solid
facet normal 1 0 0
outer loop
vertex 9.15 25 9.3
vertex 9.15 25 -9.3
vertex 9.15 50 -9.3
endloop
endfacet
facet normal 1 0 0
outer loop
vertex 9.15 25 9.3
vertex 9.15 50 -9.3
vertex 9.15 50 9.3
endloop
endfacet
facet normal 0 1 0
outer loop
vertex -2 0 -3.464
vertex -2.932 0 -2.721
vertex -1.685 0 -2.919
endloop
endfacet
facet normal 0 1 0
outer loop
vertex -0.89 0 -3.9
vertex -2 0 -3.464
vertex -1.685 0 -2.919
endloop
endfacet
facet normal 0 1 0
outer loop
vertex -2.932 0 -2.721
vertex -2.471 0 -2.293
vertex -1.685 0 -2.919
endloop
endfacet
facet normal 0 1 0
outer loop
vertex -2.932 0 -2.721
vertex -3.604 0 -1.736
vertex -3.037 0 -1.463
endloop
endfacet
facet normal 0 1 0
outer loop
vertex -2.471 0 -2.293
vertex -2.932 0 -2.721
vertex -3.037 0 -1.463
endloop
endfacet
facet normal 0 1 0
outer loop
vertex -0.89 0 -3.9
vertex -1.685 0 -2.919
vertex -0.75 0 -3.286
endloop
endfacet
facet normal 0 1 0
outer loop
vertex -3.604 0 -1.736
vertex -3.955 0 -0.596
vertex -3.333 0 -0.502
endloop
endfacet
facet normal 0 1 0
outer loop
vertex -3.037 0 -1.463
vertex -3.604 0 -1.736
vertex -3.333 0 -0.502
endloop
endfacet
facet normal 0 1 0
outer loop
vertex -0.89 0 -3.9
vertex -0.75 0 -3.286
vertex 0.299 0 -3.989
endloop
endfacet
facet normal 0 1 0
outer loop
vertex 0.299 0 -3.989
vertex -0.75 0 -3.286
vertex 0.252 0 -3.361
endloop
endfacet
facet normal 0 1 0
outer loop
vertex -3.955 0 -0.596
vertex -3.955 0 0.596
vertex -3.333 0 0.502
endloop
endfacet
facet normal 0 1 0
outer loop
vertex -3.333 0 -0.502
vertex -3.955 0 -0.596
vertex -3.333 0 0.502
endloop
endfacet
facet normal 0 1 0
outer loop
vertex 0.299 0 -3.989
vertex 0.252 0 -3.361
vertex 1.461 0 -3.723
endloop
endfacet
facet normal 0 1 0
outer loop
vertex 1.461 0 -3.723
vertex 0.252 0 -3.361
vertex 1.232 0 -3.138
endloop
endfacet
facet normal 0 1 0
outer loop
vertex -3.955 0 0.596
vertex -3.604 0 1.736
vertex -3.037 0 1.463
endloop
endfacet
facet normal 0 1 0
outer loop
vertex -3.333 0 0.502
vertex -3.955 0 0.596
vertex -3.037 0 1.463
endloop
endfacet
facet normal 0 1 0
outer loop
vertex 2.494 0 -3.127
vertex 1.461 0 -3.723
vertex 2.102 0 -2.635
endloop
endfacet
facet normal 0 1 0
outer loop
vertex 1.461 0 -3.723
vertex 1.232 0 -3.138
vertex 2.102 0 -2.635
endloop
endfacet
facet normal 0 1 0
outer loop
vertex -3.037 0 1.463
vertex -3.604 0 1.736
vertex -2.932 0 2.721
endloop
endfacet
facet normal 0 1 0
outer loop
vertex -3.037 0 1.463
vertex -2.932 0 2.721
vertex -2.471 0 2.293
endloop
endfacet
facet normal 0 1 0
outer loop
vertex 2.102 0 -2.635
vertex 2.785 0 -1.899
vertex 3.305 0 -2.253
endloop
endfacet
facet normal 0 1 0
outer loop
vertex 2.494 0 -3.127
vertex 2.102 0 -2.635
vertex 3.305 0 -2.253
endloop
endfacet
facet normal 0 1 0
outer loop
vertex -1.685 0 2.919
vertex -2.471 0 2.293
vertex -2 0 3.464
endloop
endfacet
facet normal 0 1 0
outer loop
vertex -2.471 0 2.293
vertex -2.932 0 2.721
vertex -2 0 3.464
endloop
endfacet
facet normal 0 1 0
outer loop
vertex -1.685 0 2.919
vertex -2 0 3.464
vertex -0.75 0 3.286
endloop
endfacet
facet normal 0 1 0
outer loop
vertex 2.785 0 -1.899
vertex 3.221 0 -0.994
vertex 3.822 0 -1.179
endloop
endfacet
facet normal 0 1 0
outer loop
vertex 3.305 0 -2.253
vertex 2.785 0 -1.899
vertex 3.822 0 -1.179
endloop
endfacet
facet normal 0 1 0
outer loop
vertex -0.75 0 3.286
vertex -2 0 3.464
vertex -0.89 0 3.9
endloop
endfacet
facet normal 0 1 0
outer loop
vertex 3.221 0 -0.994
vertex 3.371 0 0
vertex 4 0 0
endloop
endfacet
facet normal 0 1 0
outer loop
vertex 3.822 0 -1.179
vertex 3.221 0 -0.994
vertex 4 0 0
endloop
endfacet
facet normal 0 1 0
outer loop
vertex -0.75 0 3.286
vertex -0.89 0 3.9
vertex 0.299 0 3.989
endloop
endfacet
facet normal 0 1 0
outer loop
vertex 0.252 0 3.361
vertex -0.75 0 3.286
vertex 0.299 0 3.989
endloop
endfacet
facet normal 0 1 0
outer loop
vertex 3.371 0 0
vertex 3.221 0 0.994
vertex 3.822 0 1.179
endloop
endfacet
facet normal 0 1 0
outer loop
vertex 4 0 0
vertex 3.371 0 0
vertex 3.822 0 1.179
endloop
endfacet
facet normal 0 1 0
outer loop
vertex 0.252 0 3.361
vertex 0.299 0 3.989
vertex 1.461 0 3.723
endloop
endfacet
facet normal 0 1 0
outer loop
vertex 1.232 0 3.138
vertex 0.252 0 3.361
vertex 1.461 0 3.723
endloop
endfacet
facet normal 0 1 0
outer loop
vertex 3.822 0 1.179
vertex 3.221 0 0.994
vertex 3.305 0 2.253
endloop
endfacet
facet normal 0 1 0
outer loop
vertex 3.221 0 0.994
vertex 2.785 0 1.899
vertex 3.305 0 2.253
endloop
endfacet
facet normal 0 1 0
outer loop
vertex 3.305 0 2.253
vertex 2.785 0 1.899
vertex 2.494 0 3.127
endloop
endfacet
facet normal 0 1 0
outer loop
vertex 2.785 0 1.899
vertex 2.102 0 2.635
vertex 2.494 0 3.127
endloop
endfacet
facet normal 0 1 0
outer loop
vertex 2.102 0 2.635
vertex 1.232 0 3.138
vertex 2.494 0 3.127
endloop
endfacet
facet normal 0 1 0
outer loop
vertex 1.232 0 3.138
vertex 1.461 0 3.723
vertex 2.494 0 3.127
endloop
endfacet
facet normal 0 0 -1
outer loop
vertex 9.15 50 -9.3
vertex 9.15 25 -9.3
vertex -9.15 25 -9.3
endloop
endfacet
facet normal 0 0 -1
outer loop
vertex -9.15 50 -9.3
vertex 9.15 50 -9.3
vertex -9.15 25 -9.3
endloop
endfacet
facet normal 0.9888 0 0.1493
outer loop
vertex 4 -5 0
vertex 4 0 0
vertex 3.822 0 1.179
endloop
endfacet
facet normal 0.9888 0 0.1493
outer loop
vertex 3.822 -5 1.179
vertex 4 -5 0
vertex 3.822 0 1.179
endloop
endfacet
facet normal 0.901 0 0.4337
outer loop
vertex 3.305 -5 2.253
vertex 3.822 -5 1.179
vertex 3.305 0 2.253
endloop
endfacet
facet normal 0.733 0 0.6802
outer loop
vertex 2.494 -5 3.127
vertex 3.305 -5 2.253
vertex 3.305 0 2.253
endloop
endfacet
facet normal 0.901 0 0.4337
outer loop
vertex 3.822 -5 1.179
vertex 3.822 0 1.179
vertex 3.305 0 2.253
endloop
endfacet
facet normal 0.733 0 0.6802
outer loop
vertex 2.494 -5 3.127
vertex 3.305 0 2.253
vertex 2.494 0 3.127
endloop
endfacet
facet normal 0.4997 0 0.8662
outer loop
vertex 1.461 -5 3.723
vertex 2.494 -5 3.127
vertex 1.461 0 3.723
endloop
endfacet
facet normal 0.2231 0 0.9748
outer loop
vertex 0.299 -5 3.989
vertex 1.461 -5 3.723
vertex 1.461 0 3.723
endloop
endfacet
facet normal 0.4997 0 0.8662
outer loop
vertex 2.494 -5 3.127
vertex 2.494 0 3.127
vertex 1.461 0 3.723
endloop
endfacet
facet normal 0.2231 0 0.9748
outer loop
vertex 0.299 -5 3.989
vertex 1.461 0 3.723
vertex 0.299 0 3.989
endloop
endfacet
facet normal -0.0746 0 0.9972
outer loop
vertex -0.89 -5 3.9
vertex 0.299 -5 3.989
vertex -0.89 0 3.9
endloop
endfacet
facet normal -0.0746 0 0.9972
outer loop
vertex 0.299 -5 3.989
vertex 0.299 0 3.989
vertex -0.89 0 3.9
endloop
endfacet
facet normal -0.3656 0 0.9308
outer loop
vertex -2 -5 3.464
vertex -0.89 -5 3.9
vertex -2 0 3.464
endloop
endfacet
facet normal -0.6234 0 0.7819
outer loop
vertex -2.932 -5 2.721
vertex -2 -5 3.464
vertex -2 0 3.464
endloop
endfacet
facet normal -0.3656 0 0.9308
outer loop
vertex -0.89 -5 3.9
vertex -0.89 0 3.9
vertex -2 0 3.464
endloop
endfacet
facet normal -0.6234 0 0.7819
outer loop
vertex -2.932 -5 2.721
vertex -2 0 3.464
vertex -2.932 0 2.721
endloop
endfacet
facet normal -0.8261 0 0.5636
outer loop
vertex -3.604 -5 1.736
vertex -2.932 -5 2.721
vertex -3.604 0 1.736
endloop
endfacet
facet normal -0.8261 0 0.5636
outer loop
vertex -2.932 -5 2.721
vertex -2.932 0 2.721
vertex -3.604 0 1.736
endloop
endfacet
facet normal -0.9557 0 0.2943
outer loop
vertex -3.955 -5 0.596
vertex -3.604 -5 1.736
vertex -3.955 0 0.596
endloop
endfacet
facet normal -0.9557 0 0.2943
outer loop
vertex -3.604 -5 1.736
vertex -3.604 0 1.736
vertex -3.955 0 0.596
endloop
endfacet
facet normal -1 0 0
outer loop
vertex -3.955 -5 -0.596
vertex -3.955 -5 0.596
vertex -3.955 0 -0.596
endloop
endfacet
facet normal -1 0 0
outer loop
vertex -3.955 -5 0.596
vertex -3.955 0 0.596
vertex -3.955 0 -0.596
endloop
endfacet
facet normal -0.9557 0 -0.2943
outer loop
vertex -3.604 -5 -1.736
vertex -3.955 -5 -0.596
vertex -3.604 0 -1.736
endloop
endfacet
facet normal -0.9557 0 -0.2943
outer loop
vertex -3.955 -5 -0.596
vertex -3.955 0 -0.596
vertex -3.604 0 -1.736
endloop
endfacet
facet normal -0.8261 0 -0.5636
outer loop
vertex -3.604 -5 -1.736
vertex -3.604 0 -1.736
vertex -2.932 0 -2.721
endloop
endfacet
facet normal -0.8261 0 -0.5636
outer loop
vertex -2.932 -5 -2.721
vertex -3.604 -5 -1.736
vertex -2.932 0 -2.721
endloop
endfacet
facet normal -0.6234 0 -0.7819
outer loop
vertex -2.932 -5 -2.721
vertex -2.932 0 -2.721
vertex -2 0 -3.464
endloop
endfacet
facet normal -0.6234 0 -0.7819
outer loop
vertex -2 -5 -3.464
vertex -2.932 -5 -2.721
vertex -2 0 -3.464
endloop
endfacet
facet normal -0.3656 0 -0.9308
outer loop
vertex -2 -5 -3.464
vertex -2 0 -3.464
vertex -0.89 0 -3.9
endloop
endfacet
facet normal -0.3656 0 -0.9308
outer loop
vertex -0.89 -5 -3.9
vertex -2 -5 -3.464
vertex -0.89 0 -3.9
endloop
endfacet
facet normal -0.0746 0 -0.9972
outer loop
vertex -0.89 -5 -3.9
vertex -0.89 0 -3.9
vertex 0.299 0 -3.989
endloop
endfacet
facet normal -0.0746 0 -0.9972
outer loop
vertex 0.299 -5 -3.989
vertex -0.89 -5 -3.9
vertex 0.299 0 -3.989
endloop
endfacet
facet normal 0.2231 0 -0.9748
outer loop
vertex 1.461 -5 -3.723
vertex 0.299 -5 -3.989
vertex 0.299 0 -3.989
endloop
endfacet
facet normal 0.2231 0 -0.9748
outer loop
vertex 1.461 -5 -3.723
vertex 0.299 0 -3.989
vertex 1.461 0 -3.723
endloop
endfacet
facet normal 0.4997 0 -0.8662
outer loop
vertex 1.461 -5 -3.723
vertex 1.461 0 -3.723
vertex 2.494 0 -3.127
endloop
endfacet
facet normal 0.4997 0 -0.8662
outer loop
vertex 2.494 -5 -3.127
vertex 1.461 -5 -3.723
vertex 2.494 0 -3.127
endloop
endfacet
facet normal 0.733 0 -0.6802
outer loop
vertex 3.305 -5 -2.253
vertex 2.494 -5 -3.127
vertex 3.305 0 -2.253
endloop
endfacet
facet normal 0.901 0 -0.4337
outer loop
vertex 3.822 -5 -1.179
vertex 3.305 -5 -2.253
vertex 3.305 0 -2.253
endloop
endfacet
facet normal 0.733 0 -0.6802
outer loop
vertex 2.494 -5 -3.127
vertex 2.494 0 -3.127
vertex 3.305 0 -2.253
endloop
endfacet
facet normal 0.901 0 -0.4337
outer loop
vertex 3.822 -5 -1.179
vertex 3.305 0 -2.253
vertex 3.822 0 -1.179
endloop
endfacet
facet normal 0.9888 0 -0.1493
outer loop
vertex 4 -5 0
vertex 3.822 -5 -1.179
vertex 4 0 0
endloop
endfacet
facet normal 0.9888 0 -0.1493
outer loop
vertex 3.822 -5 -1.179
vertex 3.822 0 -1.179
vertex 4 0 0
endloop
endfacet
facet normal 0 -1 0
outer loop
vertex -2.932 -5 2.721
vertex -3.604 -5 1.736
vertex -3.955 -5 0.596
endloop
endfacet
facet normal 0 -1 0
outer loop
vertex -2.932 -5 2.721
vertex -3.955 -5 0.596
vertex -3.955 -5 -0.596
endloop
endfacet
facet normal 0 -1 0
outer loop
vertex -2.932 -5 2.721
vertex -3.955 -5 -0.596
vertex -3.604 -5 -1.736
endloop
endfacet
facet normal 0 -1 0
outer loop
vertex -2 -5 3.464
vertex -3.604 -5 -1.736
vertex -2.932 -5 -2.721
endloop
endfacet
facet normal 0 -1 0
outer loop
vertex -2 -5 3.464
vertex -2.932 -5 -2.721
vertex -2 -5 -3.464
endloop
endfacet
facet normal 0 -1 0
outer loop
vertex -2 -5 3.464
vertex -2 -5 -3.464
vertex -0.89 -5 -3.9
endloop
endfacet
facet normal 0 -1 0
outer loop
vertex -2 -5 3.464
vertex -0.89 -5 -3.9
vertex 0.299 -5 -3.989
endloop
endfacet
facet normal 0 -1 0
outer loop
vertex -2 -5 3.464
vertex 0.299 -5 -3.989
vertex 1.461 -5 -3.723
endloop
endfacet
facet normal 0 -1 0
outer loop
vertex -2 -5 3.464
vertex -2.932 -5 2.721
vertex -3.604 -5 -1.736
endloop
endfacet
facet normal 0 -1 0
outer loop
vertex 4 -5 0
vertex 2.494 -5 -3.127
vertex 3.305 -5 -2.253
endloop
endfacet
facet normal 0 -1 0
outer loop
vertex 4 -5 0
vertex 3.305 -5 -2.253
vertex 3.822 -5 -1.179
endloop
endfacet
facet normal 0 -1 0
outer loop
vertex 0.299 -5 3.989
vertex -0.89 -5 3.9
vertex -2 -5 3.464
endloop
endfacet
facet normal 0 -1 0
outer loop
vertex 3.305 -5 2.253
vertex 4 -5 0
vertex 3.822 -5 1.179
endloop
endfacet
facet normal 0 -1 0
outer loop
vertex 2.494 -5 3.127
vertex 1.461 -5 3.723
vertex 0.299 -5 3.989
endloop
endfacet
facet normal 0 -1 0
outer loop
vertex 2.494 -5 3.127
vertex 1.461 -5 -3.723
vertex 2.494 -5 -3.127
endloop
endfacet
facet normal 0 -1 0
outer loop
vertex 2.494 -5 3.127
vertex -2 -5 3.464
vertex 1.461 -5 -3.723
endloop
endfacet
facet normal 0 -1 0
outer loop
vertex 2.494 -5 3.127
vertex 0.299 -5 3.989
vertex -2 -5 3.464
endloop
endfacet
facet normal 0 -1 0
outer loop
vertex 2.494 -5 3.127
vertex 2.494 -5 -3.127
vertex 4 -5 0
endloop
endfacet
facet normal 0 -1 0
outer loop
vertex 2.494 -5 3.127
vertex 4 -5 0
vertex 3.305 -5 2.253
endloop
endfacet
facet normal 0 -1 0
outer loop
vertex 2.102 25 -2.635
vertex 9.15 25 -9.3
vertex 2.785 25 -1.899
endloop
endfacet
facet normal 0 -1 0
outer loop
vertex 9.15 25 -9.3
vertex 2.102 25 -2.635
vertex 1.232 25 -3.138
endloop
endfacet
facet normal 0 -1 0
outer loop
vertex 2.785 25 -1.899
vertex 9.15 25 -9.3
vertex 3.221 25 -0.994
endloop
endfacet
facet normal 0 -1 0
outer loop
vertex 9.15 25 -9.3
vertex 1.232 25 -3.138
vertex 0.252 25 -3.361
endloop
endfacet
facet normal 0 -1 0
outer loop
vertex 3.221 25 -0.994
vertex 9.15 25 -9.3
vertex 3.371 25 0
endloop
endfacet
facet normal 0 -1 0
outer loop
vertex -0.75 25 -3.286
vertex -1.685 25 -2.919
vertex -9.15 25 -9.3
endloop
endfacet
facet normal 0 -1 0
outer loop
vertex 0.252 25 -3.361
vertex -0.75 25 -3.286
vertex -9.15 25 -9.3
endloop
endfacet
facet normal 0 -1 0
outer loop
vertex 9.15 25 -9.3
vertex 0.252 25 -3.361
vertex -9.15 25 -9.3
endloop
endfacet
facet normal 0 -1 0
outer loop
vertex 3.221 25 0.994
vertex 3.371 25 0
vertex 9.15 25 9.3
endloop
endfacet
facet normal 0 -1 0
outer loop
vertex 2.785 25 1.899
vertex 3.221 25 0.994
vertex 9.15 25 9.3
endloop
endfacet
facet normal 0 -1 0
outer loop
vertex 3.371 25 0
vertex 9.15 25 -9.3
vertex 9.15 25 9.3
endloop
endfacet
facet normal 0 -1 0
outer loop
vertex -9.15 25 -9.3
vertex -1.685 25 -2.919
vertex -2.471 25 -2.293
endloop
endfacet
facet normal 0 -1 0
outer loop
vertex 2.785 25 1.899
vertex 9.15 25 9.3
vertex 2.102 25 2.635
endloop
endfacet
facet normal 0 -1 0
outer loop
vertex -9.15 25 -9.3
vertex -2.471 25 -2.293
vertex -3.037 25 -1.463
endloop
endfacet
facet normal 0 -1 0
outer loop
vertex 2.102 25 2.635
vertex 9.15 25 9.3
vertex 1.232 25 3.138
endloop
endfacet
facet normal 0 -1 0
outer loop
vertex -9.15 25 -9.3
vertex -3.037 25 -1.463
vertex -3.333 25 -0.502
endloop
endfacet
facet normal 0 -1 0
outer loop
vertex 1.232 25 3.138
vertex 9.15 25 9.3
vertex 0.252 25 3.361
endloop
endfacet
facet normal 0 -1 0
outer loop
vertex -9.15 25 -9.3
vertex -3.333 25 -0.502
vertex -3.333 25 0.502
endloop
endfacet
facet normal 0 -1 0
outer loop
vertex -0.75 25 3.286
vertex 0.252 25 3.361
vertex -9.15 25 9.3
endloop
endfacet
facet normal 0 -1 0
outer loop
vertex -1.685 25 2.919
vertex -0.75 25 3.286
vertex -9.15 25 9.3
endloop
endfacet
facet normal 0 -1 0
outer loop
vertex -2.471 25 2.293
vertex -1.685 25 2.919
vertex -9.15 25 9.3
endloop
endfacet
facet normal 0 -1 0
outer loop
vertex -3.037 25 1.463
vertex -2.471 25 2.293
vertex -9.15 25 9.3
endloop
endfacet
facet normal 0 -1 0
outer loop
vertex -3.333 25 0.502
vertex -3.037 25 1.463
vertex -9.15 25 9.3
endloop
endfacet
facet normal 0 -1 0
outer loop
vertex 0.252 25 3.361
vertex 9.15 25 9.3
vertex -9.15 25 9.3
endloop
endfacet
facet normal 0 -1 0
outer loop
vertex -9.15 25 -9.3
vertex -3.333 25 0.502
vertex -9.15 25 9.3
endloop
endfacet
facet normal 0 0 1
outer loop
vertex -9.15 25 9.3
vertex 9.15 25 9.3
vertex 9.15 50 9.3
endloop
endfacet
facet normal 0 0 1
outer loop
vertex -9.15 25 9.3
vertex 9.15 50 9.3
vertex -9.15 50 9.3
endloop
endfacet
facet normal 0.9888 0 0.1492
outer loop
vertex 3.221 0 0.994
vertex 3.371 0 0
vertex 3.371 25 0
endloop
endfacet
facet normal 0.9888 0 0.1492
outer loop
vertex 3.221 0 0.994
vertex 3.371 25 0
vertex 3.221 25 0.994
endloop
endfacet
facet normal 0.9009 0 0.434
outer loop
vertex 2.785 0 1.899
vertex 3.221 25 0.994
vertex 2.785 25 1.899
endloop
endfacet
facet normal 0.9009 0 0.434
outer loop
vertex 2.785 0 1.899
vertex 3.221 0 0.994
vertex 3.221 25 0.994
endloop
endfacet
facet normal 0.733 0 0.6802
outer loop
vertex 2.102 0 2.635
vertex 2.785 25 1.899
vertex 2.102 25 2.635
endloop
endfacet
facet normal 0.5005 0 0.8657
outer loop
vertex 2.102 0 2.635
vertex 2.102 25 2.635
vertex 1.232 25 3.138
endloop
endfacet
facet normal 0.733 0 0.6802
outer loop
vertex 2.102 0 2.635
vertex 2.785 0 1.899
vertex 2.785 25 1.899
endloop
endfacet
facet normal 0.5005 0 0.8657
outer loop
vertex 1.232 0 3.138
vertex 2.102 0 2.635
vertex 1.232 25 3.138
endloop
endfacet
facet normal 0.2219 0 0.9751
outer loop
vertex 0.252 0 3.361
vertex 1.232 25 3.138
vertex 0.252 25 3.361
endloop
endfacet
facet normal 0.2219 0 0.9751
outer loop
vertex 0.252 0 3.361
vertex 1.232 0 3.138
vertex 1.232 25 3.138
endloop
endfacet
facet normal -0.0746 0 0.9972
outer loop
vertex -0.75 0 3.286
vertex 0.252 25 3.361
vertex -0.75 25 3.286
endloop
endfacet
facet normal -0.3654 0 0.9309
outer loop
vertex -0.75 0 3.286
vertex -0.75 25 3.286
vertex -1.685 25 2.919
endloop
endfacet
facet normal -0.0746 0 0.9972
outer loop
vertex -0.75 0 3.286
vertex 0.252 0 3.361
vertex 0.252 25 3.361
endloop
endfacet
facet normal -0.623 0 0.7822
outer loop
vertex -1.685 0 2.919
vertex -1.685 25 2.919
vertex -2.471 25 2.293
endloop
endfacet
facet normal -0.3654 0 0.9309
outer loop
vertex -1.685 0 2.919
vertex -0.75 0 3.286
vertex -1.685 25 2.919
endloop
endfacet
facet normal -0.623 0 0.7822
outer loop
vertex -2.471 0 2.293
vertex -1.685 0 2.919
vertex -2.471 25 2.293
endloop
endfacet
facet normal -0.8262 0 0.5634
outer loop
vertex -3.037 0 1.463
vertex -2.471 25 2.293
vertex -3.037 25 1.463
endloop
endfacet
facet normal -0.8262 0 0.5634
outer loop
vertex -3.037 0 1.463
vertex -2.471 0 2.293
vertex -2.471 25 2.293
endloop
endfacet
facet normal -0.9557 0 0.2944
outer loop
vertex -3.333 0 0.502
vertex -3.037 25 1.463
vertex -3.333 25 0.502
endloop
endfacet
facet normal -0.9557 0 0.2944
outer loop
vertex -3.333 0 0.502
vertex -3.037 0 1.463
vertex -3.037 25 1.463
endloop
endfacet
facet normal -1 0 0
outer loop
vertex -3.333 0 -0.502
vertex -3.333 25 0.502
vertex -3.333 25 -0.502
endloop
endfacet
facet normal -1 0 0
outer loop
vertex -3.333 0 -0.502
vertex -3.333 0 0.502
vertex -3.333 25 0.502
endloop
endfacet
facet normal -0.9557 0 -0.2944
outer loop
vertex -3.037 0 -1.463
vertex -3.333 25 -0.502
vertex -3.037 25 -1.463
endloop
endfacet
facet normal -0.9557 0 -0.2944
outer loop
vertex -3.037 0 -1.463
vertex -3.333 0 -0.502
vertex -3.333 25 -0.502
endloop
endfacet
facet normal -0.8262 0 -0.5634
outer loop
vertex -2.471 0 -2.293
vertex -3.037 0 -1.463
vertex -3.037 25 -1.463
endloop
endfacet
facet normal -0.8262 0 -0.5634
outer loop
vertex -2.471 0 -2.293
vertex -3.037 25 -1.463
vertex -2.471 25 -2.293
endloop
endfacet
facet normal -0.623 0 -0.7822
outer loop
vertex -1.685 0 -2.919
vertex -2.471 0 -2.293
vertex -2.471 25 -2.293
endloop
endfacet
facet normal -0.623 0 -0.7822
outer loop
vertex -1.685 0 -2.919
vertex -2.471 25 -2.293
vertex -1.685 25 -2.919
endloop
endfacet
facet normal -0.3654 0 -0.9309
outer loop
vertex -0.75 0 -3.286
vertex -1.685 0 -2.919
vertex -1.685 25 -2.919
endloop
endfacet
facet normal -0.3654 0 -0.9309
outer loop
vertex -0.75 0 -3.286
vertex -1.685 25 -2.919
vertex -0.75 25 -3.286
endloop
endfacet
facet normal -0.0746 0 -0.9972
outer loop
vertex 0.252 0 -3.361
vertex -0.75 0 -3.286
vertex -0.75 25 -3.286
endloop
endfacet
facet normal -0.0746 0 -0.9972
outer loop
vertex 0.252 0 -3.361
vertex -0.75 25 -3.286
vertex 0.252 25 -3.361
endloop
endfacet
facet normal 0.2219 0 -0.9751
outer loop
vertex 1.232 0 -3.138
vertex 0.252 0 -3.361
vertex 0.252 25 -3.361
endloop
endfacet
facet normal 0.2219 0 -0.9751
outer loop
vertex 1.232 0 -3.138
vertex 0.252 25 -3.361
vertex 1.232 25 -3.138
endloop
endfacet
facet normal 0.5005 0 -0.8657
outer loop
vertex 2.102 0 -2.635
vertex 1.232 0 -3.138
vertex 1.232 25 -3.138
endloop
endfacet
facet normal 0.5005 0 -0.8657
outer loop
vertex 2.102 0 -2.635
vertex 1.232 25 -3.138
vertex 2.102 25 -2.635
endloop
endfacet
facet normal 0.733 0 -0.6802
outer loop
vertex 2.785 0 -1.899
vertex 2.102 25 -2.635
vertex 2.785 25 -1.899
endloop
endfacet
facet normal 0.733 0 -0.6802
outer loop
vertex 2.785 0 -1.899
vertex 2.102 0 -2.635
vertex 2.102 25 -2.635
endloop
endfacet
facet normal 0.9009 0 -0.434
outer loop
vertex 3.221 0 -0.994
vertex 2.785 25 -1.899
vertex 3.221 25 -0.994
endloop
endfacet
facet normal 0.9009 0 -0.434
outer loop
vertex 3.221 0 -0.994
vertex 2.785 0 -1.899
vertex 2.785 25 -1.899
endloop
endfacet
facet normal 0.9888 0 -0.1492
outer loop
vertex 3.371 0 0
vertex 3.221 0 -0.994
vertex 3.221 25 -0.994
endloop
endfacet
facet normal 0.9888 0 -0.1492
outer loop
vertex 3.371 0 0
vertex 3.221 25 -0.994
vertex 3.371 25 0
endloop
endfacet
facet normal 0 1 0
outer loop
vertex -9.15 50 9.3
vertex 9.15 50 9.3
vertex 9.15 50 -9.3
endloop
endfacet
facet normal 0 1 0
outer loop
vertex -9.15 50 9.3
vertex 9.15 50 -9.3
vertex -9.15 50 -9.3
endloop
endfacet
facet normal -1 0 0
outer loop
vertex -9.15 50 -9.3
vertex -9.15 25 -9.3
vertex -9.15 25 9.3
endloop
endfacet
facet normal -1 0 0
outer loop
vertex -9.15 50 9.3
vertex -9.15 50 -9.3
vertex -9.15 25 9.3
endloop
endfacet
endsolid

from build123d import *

# Parameters (mm, degrees)
F0_R     = 4
F1_DEPTH = 5
F2_R     = 3.370831
F3_DEPTH = 25
F4_W     = 18.300004
F4_H     = 18.600002
F5_DEPTH = 25


with BuildPart() as f1:
    # F0 (on Front) → F1 (new body)
    with BuildSketch(Plane.XZ):
        Circle(F0_R)
    extrude(amount=F1_DEPTH)

    # F2 (on Front) → F3 (join)
    with BuildSketch(Plane.XZ):
        Circle(F2_R)
    extrude(amount=-F3_DEPTH)

    # F4 (on face) → F5 (join)
    with BuildSketch(Plane(origin=(0, 25, 0), x_dir=(-1, 0, 0), z_dir=(0, 1, 0))):
        Rectangle(F4_W, F4_H)
    extrude(amount=F5_DEPTH)


solid = f1.part
